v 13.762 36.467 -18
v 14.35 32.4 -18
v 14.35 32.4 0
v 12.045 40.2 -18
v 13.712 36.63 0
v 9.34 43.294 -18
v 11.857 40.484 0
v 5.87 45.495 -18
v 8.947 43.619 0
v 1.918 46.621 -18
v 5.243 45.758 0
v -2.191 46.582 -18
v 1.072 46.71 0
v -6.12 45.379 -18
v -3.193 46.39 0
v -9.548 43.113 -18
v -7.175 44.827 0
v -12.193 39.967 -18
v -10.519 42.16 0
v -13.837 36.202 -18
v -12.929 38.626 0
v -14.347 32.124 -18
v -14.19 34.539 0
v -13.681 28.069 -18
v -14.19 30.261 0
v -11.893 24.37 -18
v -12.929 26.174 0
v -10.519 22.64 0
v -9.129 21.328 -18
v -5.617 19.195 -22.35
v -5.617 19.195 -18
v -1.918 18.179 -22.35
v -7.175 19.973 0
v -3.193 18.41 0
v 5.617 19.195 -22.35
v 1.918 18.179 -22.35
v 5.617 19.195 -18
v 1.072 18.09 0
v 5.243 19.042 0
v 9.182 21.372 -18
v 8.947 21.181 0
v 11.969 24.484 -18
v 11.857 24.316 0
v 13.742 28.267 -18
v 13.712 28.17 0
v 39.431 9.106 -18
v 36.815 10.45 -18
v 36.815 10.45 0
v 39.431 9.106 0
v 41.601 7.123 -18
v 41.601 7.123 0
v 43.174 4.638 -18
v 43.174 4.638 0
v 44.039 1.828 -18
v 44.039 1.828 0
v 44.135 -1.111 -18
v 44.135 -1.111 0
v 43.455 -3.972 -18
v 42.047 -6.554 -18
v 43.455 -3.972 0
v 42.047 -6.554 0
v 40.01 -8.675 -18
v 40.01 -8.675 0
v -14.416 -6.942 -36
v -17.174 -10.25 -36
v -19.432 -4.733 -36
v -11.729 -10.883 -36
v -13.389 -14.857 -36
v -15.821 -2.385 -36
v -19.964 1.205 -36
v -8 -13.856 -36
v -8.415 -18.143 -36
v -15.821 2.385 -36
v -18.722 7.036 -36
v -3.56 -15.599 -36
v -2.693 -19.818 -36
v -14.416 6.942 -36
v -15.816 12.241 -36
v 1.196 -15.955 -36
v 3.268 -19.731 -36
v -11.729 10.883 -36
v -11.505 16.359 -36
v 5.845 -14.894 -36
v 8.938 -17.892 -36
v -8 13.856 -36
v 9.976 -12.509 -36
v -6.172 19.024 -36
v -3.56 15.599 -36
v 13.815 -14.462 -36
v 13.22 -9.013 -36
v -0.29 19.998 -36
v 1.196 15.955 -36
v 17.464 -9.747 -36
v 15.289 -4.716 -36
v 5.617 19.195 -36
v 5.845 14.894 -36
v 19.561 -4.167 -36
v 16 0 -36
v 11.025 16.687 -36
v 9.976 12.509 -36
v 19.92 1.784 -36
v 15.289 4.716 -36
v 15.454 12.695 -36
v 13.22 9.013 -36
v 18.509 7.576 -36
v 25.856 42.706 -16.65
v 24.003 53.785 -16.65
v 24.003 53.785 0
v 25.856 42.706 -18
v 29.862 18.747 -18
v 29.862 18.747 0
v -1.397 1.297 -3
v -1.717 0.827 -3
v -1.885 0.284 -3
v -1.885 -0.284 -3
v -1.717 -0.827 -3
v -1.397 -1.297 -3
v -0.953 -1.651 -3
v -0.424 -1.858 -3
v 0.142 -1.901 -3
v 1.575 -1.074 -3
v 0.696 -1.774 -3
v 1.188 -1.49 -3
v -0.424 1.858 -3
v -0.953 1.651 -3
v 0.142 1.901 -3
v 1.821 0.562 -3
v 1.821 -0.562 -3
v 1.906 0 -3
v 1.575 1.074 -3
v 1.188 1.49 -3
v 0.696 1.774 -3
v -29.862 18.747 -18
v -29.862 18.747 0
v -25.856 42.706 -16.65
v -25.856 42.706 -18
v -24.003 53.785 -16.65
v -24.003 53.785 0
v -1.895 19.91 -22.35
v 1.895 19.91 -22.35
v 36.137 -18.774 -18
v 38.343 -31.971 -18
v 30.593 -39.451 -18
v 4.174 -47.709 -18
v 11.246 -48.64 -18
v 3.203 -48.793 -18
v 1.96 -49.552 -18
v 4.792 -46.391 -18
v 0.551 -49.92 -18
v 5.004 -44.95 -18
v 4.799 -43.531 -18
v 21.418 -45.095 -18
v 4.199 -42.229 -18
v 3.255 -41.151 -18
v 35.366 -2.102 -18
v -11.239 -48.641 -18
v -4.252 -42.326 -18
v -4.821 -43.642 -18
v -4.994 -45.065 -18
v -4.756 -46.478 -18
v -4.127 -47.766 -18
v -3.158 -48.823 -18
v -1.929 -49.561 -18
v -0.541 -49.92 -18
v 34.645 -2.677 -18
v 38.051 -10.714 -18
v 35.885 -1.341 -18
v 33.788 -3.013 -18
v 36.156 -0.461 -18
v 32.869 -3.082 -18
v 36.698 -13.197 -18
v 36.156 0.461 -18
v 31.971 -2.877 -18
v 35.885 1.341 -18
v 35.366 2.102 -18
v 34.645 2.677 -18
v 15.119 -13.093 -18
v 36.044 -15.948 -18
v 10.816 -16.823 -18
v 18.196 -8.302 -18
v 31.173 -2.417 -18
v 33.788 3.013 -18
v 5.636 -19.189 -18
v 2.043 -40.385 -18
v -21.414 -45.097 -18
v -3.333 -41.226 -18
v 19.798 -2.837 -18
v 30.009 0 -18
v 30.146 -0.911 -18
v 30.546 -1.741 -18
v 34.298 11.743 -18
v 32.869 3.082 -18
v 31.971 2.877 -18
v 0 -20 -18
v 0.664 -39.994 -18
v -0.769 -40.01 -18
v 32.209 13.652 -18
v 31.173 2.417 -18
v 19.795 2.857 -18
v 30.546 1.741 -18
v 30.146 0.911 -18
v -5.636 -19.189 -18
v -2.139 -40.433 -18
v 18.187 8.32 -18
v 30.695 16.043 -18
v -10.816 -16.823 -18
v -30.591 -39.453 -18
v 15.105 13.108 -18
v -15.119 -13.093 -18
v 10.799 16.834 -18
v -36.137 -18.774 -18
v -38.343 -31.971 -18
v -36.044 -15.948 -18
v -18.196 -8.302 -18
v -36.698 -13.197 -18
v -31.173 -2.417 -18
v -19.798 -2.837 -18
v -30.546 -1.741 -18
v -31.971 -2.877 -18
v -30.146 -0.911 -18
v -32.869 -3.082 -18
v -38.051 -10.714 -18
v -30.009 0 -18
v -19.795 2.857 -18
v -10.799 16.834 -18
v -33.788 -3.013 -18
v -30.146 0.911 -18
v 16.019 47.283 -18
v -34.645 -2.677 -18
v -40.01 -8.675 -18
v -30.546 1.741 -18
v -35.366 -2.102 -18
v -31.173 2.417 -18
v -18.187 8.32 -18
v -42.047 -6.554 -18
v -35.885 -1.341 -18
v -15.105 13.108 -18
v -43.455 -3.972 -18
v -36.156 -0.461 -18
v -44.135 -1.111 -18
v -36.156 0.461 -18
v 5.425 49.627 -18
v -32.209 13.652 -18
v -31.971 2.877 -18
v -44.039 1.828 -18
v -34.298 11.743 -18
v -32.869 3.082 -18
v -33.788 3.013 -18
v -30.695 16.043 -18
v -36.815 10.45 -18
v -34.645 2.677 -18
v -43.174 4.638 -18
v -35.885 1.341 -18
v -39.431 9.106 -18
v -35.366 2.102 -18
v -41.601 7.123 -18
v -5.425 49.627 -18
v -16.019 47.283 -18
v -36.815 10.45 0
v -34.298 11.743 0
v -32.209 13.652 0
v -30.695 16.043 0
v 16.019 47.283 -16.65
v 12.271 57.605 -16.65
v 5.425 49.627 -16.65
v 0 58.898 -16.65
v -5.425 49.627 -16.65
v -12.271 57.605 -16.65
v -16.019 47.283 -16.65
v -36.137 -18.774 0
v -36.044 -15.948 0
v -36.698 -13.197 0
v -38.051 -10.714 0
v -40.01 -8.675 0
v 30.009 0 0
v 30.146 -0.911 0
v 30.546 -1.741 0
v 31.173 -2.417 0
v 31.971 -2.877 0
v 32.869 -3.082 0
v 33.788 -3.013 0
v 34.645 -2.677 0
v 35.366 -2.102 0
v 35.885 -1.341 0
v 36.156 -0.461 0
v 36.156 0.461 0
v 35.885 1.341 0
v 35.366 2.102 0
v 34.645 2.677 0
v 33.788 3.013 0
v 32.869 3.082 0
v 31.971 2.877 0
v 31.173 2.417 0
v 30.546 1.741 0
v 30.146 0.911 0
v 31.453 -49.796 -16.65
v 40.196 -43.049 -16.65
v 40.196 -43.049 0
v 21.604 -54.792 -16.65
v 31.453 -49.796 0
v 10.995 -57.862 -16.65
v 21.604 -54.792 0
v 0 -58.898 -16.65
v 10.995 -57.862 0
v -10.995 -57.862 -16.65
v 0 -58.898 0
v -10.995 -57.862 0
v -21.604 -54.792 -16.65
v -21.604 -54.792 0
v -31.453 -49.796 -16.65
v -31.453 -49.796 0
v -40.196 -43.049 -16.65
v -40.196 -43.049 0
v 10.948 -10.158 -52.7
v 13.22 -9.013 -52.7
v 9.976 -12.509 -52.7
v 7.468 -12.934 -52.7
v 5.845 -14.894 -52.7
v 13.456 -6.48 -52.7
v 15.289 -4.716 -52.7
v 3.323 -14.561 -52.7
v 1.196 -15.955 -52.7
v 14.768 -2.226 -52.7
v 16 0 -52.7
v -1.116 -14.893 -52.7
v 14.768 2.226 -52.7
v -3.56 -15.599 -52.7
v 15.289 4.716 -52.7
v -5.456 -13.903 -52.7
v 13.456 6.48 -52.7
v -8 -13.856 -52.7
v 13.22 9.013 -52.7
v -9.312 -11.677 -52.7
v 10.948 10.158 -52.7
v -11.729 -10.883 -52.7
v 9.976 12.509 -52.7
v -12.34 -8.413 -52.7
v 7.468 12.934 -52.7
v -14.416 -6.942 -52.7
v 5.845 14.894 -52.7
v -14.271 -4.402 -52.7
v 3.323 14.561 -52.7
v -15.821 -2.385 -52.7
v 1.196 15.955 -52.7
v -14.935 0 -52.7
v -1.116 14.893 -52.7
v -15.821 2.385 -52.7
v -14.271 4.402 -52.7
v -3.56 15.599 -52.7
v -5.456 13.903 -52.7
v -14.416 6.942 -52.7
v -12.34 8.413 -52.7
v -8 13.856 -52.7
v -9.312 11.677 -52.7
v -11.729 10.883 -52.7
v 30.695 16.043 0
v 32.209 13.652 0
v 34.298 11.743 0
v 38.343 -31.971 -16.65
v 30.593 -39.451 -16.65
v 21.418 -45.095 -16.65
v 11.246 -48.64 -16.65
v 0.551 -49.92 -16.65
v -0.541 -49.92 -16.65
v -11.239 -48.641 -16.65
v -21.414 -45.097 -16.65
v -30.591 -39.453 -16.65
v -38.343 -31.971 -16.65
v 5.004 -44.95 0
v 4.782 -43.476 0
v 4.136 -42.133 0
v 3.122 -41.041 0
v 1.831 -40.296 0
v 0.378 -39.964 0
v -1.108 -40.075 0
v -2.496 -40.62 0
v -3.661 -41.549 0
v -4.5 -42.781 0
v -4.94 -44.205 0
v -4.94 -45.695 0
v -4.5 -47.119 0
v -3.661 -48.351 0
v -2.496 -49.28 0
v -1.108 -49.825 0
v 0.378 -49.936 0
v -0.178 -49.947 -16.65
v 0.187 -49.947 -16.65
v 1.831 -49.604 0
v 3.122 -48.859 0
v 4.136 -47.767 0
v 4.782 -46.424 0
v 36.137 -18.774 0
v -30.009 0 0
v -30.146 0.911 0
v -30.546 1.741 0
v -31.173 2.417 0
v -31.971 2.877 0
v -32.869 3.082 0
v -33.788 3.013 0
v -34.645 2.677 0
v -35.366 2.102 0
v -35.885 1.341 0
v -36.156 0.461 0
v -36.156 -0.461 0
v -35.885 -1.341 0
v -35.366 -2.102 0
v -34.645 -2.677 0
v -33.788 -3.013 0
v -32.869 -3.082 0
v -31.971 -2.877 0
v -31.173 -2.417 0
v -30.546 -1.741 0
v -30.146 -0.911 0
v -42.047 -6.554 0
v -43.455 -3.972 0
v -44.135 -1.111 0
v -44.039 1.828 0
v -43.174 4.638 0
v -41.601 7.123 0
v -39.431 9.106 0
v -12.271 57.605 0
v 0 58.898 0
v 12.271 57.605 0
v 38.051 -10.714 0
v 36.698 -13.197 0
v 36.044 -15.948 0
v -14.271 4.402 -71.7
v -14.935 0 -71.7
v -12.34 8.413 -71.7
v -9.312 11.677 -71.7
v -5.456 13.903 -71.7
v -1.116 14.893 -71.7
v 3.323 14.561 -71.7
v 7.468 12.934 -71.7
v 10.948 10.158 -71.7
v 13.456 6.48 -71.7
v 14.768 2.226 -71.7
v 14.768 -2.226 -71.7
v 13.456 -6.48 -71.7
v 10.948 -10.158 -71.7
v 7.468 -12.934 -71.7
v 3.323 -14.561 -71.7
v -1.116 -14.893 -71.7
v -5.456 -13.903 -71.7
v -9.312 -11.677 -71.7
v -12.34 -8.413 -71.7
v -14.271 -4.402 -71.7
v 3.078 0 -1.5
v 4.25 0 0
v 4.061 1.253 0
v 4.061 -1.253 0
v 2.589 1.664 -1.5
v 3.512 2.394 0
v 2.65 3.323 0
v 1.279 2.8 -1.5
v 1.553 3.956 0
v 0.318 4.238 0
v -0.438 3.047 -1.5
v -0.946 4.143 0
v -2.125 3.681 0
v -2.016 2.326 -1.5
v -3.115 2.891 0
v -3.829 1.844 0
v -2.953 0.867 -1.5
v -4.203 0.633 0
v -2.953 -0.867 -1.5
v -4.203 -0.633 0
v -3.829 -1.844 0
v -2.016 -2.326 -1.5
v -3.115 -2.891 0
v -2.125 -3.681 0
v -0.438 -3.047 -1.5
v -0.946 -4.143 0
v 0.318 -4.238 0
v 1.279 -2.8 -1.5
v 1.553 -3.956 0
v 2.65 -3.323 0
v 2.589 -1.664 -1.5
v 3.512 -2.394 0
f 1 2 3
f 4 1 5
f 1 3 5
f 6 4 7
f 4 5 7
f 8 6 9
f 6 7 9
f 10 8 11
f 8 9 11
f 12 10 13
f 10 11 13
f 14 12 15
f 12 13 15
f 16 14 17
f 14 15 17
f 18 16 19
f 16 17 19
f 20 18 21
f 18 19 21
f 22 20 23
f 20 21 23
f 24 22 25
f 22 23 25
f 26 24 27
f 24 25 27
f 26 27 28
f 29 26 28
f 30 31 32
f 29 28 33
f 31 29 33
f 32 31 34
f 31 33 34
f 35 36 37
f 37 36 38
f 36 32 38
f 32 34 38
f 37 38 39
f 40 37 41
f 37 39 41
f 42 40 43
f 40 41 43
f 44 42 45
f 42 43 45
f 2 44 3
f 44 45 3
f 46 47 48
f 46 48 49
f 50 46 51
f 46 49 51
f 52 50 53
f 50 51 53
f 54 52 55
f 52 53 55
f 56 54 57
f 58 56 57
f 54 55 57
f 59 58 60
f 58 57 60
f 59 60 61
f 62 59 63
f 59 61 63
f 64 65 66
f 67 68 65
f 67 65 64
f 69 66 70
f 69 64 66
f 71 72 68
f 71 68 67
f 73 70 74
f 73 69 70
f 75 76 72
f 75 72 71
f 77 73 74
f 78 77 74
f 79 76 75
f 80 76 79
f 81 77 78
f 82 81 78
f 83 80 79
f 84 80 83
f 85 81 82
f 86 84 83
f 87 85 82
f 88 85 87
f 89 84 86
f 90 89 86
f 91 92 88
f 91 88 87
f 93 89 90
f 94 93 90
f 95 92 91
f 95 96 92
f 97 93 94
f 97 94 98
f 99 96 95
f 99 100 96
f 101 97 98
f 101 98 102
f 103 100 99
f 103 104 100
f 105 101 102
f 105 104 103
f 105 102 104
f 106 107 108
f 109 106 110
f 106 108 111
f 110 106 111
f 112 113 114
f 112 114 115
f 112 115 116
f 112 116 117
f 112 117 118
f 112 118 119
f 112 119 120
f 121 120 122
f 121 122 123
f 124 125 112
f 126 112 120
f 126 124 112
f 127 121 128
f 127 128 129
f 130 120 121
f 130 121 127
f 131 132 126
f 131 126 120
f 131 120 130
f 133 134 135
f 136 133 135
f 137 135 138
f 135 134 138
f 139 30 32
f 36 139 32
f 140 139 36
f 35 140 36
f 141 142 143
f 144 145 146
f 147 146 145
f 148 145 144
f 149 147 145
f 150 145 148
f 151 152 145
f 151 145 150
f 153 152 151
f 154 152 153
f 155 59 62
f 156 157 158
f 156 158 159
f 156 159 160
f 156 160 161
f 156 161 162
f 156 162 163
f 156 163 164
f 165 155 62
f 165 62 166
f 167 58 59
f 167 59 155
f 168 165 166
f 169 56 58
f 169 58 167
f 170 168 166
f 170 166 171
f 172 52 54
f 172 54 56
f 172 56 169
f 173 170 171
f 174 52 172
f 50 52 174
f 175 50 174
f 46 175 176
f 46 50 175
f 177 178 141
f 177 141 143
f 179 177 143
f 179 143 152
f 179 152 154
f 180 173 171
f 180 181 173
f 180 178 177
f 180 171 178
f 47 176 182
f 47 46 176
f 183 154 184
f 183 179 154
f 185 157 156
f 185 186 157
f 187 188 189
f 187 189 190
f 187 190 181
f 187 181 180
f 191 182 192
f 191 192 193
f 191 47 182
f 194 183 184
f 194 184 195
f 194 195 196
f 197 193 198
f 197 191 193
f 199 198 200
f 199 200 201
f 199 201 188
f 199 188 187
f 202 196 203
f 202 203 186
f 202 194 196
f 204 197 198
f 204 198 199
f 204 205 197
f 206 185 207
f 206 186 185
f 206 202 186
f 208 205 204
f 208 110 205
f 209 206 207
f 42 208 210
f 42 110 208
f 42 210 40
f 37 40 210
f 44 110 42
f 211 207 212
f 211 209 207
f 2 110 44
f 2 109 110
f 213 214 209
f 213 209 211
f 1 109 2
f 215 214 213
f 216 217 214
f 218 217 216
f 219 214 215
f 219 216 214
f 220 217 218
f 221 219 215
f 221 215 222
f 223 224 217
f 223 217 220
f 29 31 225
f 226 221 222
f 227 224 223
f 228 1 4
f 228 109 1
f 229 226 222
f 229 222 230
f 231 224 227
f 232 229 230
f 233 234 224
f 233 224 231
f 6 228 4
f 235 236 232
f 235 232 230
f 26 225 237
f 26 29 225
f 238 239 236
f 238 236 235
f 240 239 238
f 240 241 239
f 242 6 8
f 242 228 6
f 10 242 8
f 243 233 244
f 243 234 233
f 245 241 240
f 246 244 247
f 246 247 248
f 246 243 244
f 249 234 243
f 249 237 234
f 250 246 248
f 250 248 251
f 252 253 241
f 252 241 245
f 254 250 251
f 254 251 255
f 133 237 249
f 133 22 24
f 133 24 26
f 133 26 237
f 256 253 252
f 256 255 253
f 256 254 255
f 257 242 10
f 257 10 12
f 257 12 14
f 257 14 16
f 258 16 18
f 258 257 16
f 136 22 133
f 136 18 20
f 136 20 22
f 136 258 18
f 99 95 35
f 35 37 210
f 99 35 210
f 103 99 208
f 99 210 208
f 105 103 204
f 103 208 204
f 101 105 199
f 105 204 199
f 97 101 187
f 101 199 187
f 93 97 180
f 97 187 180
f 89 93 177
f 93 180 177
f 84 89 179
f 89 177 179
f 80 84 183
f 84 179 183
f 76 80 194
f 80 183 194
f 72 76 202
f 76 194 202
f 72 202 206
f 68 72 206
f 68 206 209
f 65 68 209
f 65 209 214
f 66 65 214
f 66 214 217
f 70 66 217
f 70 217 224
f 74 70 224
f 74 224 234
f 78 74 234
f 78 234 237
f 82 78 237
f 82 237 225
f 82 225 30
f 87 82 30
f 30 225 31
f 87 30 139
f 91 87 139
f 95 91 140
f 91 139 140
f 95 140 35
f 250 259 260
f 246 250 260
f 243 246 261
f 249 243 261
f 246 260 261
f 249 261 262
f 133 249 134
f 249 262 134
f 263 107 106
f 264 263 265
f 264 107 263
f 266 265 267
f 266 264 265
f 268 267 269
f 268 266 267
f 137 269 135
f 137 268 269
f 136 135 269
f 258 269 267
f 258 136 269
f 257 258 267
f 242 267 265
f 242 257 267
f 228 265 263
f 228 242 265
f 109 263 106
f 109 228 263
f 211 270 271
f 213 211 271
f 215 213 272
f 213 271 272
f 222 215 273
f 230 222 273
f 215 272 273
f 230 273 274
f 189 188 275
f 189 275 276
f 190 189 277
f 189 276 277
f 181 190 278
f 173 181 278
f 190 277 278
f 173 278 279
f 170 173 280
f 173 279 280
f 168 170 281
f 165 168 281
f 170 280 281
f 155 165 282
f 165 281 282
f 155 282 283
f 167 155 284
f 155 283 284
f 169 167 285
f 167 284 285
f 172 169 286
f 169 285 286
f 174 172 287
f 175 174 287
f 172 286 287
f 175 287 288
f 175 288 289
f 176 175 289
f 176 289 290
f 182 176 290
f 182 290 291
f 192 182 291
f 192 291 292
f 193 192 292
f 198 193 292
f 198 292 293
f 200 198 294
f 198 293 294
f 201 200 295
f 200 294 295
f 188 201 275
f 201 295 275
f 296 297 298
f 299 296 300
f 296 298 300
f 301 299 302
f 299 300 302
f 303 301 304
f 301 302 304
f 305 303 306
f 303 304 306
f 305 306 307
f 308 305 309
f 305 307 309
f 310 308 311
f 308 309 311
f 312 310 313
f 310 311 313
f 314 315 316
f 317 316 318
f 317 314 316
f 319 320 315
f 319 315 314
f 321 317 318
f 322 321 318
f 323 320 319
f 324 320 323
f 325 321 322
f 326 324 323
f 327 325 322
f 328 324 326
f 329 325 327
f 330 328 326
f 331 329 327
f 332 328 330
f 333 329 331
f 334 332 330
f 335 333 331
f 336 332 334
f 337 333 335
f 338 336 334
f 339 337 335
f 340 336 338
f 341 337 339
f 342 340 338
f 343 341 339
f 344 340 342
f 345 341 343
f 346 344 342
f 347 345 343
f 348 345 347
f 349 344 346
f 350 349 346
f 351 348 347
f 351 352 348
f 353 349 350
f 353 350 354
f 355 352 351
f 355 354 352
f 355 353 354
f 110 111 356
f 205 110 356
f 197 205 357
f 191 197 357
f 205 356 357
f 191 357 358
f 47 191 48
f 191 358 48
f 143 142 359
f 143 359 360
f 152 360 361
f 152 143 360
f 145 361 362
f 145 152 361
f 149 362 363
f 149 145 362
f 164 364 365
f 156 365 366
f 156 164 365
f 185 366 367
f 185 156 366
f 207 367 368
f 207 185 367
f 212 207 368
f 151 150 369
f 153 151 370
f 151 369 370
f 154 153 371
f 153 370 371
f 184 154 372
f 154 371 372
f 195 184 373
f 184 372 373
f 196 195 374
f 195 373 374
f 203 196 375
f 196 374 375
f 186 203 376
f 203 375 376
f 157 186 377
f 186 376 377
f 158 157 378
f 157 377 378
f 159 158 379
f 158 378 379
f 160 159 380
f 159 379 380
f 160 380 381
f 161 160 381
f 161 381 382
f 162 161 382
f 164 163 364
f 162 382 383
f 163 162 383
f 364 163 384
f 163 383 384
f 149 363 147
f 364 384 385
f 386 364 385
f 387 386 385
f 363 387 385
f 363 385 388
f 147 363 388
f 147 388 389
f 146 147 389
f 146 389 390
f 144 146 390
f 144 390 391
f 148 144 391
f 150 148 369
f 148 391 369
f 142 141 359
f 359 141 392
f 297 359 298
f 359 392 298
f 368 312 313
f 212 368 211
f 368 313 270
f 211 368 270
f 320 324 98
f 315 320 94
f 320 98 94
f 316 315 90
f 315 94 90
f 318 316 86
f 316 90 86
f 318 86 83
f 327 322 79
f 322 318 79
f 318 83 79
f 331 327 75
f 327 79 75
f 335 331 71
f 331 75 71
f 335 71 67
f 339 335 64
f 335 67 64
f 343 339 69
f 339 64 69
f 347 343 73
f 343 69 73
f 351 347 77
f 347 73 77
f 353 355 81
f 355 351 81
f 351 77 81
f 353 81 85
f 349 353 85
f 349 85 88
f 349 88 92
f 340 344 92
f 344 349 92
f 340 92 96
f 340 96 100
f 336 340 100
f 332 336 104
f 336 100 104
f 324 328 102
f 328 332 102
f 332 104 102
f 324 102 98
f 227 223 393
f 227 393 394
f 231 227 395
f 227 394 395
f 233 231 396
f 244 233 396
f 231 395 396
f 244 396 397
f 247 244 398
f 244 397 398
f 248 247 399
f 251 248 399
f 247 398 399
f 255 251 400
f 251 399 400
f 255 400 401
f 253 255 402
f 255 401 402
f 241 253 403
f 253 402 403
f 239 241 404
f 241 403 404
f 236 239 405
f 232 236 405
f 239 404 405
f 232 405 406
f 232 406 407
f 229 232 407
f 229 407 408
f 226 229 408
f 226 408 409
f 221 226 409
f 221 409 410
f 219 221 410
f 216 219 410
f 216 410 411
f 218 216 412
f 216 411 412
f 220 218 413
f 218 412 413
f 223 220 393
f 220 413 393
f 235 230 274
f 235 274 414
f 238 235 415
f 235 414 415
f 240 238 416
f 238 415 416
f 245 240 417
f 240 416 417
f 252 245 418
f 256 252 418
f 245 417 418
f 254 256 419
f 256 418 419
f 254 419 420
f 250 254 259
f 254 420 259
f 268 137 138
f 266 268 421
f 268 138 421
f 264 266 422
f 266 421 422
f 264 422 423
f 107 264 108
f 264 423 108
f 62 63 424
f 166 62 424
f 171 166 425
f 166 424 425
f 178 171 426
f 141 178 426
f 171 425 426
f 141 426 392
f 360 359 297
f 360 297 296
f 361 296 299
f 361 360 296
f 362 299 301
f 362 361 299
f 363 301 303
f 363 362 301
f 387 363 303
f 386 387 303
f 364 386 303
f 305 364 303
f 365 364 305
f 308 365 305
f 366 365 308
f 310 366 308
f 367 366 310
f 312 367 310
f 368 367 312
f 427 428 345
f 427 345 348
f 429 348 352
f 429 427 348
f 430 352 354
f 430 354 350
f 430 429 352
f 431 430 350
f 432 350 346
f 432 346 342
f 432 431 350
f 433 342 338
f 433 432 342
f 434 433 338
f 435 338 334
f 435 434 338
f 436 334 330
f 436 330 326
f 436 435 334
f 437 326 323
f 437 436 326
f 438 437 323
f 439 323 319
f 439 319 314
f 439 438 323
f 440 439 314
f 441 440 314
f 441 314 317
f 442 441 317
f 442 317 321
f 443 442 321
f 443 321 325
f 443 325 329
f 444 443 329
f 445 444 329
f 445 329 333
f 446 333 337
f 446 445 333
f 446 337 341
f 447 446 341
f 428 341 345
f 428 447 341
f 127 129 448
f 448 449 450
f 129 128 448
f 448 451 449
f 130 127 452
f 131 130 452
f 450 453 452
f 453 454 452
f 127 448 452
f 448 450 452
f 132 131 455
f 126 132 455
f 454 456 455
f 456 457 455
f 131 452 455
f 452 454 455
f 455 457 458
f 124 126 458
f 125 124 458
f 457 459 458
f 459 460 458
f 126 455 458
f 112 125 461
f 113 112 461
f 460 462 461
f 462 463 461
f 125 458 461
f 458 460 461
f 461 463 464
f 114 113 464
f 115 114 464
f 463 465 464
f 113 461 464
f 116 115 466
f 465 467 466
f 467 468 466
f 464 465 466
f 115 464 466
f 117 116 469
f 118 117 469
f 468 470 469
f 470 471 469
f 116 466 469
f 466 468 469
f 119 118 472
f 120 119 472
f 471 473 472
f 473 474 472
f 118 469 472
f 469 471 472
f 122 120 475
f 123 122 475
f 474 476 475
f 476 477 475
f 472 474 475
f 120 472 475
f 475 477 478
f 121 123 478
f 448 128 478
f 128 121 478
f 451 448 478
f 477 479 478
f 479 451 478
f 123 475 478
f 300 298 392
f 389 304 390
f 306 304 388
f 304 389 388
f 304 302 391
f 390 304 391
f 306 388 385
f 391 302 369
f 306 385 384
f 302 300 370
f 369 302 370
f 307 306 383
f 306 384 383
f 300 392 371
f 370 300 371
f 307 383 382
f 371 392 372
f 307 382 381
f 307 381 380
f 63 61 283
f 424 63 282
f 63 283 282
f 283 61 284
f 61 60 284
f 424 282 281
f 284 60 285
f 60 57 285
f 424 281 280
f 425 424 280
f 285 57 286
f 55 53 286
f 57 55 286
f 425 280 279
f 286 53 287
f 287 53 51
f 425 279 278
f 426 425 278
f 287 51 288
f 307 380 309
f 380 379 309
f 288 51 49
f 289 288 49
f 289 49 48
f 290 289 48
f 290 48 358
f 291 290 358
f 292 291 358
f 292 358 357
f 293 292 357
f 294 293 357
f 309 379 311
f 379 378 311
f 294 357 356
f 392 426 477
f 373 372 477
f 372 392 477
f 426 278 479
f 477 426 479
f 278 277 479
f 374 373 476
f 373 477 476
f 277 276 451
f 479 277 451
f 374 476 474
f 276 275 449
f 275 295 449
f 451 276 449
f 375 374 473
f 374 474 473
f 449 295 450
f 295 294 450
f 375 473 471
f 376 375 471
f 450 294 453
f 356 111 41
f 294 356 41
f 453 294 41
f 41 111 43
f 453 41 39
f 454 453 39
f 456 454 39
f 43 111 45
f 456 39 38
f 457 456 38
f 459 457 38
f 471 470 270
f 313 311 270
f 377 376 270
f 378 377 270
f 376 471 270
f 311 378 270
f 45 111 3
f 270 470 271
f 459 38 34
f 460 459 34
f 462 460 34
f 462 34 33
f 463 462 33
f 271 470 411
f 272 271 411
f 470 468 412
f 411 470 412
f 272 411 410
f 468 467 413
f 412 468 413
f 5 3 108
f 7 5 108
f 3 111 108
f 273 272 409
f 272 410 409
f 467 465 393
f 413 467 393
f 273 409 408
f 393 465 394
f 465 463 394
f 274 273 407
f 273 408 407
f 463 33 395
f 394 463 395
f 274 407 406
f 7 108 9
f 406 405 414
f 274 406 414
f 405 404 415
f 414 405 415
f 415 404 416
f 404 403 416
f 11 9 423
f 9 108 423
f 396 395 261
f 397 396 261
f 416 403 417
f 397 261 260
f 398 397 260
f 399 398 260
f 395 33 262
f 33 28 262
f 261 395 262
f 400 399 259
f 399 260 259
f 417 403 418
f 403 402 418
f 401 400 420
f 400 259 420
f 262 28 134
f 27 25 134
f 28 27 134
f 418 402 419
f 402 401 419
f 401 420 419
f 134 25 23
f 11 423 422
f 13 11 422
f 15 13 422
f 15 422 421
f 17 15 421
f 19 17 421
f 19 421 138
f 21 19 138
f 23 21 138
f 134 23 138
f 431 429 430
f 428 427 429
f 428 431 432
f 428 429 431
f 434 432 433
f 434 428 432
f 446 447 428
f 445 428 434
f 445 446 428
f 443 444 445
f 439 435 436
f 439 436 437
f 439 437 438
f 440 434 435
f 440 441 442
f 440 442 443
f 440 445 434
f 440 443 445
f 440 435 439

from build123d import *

# Parameters (mm, degrees)
SKETCH1_R           = 3.090826528
SKETCH1_R_2         = 14.35
SKETCH1_R_3         = 5
BOSS_EXTRUDE1_DEPTH = 18
SKETCH2_R           = 20
BOSS_EXTRUDE2_DEPTH = 18
SKETCH3_R           = 16
BOSS_EXTRUDE3_DEPTH = 35.7
SKETCH5_OUTSIDE_W   = 123.14
SKETCH5_OUTSIDE_H   = 152.554
SKETCH5_OUTSIDE_R   = 14.935
CUT_EXTRUDE1_DEPTH  = 19
SKETCH6_R           = 14.35
CUT_EXTRUDE2_DEPTH  = 22.35
SKETCH7_R           = 4.25
CUT_EXTRUDE3_DEPTH  = 3
CUT_EXTRUDE3_DRAFT  = -38
SKETCH9_OUTSIDE_W   = 123.14
SKETCH9_OUTSIDE_H   = 152.554
SKETCH9_OUTSIDE_R   = 49.923055682
CUT_EXTRUDE4_DEPTH  = 1.35


with BuildPart() as part:
    # Sketch1 → Boss-Extrude1 (new body)
    with BuildSketch(Plane.XY):
        with BuildLine():
            Line((36.136520686, -18.774478422), (40.195752281, -43.049171521))
            ThreePointArc((40.195752281, -43.049171521), (0, -58.897620241), (-40.195752281, -43.049171521))
            Line((-40.195752281, -43.049171521), (-36.136520686, -18.774478422))
            ThreePointArc((-36.136520686, -18.774478422), (-36.697665198, -13.197066935), (-40.010085223, -8.674868838))
            ThreePointArc((-40.010085223, -8.674868838), (-44.039037615, 1.827589449), (-36.814887741, 10.449987378))
            ThreePointArc((-36.814887741, 10.449987378), (-32.208677837, 13.651878045), (-29.862109135, 18.747257211))
            Line((-29.862109135, 18.747257211), (-24.003146652, 53.784557457))
            ThreePointArc((-24.003146652, 53.784557457), (0, 58.897620241), (24.003146652, 53.784557457))
            Line((24.003146652, 53.784557457), (29.862109135, 18.747257211))
            ThreePointArc((29.862109135, 18.747257211), (32.208677837, 13.651878045), (36.814887741, 10.449987378))
            ThreePointArc((36.814887741, 10.449987378), (44.039037615, 1.827589449), (40.010085223, -8.674868838))
            ThreePointArc((40.010085223, -8.674868838), (36.697665198, -13.197066935), (36.136520686, -18.774478422))
        make_face()
        with Locations((-33.1, 0)):
            Circle(SKETCH1_R, mode=Mode.SUBTRACT)
        with Locations(Location((33.1, 0, 0), (0, 0, 180))):
            Circle(SKETCH1_R, mode=Mode.SUBTRACT)
        with Locations((0, 32.4)):
            Circle(SKETCH1_R_2, mode=Mode.SUBTRACT)
        with Locations((0.004379967, -44.949999787)):
            Circle(SKETCH1_R_3, mode=Mode.SUBTRACT)
    extrude(amount=-BOSS_EXTRUDE1_DEPTH)

    # Sketch2 → Boss-Extrude2 (add)
    with BuildSketch(Plane(origin=(0, 0, -18), x_dir=(-1, 0, 0), z_dir=(0, 0, -1))):
        with Locations(Location((0, 0, 0), (0, 0, 106.311047481))):
            Circle(SKETCH2_R)
    extrude(amount=BOSS_EXTRUDE2_DEPTH)

    # Sketch3 → Boss-Extrude3 (add)
    with BuildSketch(Plane(origin=(0, 0, -36), x_dir=(-1, 0, 0), z_dir=(0, 0, -1))):
        with Locations(Location((0, 0, 0), (0, 0, 180))):
            Circle(SKETCH3_R)
    extrude(amount=BOSS_EXTRUDE3_DEPTH)

    # Sketch5 outside → Cut-Extrude1 (cut)
    with BuildSketch(Plane(origin=(0, 0, -71.7), x_dir=(-1, 0, 0), z_dir=(0, 0, -1))):
        Rectangle(SKETCH5_OUTSIDE_W, SKETCH5_OUTSIDE_H)
        Circle(SKETCH5_OUTSIDE_R, mode=Mode.SUBTRACT)
    extrude(amount=-CUT_EXTRUDE1_DEPTH, mode=Mode.SUBTRACT)

    # Sketch6 → Cut-Extrude2 (cut)
    with BuildSketch(Plane.XY):
        with Locations((0, 32.4)):
            Circle(SKETCH6_R)
    extrude(amount=-CUT_EXTRUDE2_DEPTH, mode=Mode.SUBTRACT)


with BuildPart() as cut_extrude3_tool:
    # Sketch7 → Cut-Extrude3 (with draft: the straight prism first)
    with BuildSketch(Plane.XY):
        Circle(SKETCH7_R)
    extrude(amount=-CUT_EXTRUDE3_DEPTH)
    # Cut-Extrude3: the draft: its side faces are tilted about the plane it starts from
    cut_extrude3_sides = [cut_extrude3_tool.faces().sort_by_distance(p)[0] for p in [
        (-4.25, 0, -1.5),
    ]]
    draft(cut_extrude3_sides, Plane.XY, CUT_EXTRUDE3_DRAFT)


with BuildPart() as part_1:
    add(part.part)

    # Cut-Extrude3: cut by cut_extrude3_tool
    add(cut_extrude3_tool.part, mode=Mode.SUBTRACT)

    # Sketch9 outside → Cut-Extrude4 (cut)
    with BuildSketch(Plane(origin=(0, 0, -18), x_dir=(-1, 0, 0), z_dir=(0, 0, -1))):
        Rectangle(SKETCH9_OUTSIDE_W, SKETCH9_OUTSIDE_H)
        Circle(SKETCH9_OUTSIDE_R, mode=Mode.SUBTRACT)
    extrude(amount=-CUT_EXTRUDE4_DEPTH, mode=Mode.SUBTRACT)


solid = part_1.part
